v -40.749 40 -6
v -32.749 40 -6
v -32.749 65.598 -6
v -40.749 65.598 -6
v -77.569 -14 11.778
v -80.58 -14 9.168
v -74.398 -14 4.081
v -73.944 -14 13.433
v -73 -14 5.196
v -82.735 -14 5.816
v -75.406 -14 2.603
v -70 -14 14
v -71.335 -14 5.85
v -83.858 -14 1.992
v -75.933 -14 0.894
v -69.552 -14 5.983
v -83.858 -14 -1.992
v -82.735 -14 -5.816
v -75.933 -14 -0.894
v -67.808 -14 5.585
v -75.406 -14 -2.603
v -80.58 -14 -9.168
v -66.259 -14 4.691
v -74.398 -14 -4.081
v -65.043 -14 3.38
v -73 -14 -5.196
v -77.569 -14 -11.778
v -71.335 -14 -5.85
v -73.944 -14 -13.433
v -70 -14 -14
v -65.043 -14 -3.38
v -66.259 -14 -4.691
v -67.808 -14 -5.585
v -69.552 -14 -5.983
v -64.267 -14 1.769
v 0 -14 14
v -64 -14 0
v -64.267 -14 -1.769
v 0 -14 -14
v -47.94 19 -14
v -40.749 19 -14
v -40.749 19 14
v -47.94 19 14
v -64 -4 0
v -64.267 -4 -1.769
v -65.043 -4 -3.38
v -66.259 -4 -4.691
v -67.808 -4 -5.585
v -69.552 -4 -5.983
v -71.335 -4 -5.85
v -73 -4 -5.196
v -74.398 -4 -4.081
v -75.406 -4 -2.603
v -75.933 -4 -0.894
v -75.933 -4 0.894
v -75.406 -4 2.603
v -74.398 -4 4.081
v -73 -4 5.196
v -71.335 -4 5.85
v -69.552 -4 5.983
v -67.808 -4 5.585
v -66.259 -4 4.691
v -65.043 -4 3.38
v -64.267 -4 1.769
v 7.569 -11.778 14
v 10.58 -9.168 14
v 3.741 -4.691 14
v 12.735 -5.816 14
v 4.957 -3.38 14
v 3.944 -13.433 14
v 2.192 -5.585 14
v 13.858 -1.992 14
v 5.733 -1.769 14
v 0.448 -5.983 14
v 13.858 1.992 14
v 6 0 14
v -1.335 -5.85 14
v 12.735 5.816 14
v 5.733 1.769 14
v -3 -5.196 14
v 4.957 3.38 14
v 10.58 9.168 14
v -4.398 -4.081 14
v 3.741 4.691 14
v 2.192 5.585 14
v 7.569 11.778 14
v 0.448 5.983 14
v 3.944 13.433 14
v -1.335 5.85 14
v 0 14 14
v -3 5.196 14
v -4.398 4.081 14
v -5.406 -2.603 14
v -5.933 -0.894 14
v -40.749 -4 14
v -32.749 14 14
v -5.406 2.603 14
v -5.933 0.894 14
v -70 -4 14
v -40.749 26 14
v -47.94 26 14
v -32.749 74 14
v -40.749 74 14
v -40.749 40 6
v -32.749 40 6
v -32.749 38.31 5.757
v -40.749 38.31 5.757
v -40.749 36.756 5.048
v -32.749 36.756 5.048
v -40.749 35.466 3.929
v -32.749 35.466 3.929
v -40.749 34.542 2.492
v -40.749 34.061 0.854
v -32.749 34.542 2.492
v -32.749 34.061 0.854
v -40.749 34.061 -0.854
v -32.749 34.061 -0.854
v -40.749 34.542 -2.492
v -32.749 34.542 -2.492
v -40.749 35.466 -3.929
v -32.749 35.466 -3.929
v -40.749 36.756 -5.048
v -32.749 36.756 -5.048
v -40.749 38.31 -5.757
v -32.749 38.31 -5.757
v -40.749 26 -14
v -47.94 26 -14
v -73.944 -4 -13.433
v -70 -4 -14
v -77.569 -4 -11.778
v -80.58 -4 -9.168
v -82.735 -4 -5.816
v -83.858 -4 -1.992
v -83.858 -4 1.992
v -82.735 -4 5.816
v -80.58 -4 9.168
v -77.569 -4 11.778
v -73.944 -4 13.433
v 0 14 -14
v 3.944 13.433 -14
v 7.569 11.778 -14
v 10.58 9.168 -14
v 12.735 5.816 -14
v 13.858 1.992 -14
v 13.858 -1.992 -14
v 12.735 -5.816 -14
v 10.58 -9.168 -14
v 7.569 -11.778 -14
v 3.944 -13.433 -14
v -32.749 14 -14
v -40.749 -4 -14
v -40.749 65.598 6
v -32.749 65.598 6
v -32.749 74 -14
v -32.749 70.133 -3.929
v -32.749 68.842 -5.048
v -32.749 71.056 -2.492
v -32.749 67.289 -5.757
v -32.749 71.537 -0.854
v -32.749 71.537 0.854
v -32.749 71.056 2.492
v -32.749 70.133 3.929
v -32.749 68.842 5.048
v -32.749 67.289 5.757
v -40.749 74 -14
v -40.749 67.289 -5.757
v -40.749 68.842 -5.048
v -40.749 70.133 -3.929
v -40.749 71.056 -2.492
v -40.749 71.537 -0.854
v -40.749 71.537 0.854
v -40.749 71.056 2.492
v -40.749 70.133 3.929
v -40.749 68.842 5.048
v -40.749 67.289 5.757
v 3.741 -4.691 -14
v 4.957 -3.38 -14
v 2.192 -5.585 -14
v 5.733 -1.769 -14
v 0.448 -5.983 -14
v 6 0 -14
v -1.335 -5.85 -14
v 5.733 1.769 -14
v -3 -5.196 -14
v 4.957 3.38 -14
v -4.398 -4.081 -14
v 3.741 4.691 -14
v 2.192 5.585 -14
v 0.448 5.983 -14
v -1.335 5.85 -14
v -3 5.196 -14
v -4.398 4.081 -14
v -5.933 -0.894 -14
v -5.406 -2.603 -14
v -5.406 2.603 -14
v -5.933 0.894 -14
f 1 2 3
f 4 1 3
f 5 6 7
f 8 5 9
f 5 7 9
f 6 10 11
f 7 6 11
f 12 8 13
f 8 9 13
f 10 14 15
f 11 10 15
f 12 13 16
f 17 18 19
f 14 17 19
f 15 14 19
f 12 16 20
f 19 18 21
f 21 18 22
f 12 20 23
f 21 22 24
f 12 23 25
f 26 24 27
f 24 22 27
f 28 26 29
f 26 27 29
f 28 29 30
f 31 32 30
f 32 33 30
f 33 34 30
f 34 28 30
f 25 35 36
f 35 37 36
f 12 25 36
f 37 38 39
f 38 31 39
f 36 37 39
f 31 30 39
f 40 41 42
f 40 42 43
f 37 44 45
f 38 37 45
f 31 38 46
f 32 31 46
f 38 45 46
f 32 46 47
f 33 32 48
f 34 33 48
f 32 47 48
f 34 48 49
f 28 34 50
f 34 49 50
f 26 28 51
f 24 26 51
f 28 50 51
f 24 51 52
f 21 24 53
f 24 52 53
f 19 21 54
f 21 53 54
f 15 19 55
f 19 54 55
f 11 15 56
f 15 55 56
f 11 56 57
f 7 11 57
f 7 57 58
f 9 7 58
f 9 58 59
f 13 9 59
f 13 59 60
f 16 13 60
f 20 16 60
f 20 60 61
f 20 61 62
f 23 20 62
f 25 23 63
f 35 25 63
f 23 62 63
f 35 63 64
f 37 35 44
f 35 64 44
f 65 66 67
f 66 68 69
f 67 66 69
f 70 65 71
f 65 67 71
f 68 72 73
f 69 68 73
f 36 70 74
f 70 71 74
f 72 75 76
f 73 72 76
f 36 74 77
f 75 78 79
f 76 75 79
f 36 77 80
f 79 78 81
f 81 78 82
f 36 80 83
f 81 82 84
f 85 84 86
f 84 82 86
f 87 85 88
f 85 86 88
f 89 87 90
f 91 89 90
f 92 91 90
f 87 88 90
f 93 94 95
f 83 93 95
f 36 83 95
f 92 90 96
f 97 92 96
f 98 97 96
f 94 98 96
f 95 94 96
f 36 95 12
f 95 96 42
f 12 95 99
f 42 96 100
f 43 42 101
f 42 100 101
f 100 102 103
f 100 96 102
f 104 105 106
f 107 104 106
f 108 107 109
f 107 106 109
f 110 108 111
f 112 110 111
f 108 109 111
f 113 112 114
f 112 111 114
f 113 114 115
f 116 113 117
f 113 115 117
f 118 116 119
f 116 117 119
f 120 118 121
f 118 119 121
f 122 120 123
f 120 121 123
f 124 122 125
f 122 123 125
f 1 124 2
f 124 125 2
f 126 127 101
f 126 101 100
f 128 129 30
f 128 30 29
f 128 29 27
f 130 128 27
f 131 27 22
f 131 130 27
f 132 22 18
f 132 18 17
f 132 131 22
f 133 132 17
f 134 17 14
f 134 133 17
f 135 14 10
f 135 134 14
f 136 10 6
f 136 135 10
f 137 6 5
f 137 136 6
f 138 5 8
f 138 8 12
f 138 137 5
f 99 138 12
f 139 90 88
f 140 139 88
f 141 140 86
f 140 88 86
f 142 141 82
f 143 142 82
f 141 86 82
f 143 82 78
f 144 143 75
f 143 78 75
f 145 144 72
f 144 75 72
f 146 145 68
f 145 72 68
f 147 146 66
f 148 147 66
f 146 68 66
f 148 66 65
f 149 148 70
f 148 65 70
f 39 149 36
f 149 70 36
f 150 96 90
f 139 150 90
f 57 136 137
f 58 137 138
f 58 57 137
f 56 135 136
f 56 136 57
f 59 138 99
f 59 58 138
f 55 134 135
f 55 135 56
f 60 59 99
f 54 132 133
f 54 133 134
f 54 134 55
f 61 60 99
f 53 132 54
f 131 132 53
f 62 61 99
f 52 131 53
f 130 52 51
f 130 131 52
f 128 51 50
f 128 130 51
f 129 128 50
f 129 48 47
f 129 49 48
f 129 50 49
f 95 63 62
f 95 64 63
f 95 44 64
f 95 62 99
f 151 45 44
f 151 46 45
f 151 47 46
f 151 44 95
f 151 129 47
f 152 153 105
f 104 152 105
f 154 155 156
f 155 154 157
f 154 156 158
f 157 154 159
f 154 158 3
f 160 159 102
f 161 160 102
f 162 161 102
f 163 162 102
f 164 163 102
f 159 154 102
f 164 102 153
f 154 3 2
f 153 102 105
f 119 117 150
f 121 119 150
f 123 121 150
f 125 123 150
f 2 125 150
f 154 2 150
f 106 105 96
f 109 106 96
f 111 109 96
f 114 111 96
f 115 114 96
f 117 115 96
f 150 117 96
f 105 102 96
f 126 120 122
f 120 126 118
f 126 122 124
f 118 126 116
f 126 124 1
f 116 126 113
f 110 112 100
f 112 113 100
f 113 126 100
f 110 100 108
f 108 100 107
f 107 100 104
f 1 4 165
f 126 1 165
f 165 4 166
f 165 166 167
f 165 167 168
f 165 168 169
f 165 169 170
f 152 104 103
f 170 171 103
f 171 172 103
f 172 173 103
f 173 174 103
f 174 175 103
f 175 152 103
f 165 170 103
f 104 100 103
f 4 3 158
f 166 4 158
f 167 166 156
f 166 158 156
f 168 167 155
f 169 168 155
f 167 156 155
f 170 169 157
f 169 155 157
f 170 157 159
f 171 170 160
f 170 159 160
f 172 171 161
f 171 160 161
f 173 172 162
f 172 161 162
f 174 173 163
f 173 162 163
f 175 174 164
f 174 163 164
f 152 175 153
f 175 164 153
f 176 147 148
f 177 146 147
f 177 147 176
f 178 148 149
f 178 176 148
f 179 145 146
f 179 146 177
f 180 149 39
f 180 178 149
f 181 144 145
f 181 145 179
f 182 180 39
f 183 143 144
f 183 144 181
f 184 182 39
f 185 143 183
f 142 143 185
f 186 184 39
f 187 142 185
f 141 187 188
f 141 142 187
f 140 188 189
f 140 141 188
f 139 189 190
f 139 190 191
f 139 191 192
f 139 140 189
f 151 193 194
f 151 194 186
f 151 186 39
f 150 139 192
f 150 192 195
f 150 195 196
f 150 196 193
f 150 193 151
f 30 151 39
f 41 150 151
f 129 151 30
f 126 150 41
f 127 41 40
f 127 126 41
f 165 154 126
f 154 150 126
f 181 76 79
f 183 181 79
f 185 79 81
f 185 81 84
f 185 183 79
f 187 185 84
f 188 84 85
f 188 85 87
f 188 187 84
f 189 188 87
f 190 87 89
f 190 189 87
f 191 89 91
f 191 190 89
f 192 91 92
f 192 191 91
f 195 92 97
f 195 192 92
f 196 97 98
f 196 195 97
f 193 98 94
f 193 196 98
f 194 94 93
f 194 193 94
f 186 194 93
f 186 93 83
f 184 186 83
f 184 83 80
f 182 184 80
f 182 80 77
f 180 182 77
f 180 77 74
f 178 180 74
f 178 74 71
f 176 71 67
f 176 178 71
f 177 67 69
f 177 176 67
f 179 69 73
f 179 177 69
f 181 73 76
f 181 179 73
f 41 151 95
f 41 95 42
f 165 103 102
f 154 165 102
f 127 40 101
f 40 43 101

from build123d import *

# Parameters (mm, degrees)
SKETCH1_R           = 6
BOSS_EXTRUDE1_DEPTH = 14
BOSS_EXTRUDE3_DEPTH = 10
SKETCH4_R           = 6
CUT_EXTRUDE1_DEPTH  = 10
CUT_EXTRUDE2_DEPTH  = 10


with BuildPart() as part:
    # Sketch1 → Boss-Extrude1 (new body, symmetric)
    with BuildSketch(Plane.XY):
        with BuildLine():
            Line((0, -14), (-70, -14))
            Line((-70, -14), (-70, -4))
            Line((-70, -4), (-40.749302813, -4))
            Line((-40.749302813, -4), (-40.749302813, 19))
            Line((-40.749302813, 19), (-47.94035625, 19))
            Line((-47.94035625, 19), (-47.94035625, 26))
            Line((-47.94035625, 26), (-40.749302813, 26))
            Line((-40.749302813, 26), (-40.749302813, 74))
            Line((-40.749302813, 74), (-32.749302813, 74))
            Line((-32.749302813, 74), (-32.749302813, 14))
            Line((-32.749302813, 14), (0, 14))
            ThreePointArc((0, 14), (14, 0), (0, -14))
        make_face()
        Circle(SKETCH1_R, mode=Mode.SUBTRACT)
    extrude(amount=BOSS_EXTRUDE1_DEPTH, both=True)

    # Sketch3 → Boss-Extrude3 (add)
    with BuildSketch(Plane(origin=(0, -4, 0), x_dir=(1, 0, 0), z_dir=(0, 1, 0))):
        with BuildLine():
            Line((-70, -14), (-70, 14))
            ThreePointArc((-70, 14), (-84, 0), (-70, -14))
        make_face()
    extrude(amount=-BOSS_EXTRUDE3_DEPTH)

    # Sketch4 → Cut-Extrude1 (cut)
    with BuildSketch(Plane(origin=(0, -4, 0), x_dir=(1, 0, 0), z_dir=(0, 1, 0))):
        with Locations((-70, 0)):
            Circle(SKETCH4_R)
    extrude(amount=-CUT_EXTRUDE1_DEPTH, mode=Mode.SUBTRACT)

    # Sketch5 → Cut-Extrude2 (cut)
    with BuildSketch(Plane(origin=(-32.749302813, 0, 0), x_dir=(0, 0, -1), z_dir=(1, 0, 0))):
        with BuildLine():
            Line((-6, 65.598278873), (-6, 40))
            ThreePointArc((-6, 40), (0, 34), (6, 40))
            Line((6, 40), (6, 65.598278873))
            ThreePointArc((6, 65.598278873), (0, 71.598278873), (-6, 65.598278873))
        make_face()
    extrude(amount=-CUT_EXTRUDE2_DEPTH, mode=Mode.SUBTRACT)


solid = part.part
